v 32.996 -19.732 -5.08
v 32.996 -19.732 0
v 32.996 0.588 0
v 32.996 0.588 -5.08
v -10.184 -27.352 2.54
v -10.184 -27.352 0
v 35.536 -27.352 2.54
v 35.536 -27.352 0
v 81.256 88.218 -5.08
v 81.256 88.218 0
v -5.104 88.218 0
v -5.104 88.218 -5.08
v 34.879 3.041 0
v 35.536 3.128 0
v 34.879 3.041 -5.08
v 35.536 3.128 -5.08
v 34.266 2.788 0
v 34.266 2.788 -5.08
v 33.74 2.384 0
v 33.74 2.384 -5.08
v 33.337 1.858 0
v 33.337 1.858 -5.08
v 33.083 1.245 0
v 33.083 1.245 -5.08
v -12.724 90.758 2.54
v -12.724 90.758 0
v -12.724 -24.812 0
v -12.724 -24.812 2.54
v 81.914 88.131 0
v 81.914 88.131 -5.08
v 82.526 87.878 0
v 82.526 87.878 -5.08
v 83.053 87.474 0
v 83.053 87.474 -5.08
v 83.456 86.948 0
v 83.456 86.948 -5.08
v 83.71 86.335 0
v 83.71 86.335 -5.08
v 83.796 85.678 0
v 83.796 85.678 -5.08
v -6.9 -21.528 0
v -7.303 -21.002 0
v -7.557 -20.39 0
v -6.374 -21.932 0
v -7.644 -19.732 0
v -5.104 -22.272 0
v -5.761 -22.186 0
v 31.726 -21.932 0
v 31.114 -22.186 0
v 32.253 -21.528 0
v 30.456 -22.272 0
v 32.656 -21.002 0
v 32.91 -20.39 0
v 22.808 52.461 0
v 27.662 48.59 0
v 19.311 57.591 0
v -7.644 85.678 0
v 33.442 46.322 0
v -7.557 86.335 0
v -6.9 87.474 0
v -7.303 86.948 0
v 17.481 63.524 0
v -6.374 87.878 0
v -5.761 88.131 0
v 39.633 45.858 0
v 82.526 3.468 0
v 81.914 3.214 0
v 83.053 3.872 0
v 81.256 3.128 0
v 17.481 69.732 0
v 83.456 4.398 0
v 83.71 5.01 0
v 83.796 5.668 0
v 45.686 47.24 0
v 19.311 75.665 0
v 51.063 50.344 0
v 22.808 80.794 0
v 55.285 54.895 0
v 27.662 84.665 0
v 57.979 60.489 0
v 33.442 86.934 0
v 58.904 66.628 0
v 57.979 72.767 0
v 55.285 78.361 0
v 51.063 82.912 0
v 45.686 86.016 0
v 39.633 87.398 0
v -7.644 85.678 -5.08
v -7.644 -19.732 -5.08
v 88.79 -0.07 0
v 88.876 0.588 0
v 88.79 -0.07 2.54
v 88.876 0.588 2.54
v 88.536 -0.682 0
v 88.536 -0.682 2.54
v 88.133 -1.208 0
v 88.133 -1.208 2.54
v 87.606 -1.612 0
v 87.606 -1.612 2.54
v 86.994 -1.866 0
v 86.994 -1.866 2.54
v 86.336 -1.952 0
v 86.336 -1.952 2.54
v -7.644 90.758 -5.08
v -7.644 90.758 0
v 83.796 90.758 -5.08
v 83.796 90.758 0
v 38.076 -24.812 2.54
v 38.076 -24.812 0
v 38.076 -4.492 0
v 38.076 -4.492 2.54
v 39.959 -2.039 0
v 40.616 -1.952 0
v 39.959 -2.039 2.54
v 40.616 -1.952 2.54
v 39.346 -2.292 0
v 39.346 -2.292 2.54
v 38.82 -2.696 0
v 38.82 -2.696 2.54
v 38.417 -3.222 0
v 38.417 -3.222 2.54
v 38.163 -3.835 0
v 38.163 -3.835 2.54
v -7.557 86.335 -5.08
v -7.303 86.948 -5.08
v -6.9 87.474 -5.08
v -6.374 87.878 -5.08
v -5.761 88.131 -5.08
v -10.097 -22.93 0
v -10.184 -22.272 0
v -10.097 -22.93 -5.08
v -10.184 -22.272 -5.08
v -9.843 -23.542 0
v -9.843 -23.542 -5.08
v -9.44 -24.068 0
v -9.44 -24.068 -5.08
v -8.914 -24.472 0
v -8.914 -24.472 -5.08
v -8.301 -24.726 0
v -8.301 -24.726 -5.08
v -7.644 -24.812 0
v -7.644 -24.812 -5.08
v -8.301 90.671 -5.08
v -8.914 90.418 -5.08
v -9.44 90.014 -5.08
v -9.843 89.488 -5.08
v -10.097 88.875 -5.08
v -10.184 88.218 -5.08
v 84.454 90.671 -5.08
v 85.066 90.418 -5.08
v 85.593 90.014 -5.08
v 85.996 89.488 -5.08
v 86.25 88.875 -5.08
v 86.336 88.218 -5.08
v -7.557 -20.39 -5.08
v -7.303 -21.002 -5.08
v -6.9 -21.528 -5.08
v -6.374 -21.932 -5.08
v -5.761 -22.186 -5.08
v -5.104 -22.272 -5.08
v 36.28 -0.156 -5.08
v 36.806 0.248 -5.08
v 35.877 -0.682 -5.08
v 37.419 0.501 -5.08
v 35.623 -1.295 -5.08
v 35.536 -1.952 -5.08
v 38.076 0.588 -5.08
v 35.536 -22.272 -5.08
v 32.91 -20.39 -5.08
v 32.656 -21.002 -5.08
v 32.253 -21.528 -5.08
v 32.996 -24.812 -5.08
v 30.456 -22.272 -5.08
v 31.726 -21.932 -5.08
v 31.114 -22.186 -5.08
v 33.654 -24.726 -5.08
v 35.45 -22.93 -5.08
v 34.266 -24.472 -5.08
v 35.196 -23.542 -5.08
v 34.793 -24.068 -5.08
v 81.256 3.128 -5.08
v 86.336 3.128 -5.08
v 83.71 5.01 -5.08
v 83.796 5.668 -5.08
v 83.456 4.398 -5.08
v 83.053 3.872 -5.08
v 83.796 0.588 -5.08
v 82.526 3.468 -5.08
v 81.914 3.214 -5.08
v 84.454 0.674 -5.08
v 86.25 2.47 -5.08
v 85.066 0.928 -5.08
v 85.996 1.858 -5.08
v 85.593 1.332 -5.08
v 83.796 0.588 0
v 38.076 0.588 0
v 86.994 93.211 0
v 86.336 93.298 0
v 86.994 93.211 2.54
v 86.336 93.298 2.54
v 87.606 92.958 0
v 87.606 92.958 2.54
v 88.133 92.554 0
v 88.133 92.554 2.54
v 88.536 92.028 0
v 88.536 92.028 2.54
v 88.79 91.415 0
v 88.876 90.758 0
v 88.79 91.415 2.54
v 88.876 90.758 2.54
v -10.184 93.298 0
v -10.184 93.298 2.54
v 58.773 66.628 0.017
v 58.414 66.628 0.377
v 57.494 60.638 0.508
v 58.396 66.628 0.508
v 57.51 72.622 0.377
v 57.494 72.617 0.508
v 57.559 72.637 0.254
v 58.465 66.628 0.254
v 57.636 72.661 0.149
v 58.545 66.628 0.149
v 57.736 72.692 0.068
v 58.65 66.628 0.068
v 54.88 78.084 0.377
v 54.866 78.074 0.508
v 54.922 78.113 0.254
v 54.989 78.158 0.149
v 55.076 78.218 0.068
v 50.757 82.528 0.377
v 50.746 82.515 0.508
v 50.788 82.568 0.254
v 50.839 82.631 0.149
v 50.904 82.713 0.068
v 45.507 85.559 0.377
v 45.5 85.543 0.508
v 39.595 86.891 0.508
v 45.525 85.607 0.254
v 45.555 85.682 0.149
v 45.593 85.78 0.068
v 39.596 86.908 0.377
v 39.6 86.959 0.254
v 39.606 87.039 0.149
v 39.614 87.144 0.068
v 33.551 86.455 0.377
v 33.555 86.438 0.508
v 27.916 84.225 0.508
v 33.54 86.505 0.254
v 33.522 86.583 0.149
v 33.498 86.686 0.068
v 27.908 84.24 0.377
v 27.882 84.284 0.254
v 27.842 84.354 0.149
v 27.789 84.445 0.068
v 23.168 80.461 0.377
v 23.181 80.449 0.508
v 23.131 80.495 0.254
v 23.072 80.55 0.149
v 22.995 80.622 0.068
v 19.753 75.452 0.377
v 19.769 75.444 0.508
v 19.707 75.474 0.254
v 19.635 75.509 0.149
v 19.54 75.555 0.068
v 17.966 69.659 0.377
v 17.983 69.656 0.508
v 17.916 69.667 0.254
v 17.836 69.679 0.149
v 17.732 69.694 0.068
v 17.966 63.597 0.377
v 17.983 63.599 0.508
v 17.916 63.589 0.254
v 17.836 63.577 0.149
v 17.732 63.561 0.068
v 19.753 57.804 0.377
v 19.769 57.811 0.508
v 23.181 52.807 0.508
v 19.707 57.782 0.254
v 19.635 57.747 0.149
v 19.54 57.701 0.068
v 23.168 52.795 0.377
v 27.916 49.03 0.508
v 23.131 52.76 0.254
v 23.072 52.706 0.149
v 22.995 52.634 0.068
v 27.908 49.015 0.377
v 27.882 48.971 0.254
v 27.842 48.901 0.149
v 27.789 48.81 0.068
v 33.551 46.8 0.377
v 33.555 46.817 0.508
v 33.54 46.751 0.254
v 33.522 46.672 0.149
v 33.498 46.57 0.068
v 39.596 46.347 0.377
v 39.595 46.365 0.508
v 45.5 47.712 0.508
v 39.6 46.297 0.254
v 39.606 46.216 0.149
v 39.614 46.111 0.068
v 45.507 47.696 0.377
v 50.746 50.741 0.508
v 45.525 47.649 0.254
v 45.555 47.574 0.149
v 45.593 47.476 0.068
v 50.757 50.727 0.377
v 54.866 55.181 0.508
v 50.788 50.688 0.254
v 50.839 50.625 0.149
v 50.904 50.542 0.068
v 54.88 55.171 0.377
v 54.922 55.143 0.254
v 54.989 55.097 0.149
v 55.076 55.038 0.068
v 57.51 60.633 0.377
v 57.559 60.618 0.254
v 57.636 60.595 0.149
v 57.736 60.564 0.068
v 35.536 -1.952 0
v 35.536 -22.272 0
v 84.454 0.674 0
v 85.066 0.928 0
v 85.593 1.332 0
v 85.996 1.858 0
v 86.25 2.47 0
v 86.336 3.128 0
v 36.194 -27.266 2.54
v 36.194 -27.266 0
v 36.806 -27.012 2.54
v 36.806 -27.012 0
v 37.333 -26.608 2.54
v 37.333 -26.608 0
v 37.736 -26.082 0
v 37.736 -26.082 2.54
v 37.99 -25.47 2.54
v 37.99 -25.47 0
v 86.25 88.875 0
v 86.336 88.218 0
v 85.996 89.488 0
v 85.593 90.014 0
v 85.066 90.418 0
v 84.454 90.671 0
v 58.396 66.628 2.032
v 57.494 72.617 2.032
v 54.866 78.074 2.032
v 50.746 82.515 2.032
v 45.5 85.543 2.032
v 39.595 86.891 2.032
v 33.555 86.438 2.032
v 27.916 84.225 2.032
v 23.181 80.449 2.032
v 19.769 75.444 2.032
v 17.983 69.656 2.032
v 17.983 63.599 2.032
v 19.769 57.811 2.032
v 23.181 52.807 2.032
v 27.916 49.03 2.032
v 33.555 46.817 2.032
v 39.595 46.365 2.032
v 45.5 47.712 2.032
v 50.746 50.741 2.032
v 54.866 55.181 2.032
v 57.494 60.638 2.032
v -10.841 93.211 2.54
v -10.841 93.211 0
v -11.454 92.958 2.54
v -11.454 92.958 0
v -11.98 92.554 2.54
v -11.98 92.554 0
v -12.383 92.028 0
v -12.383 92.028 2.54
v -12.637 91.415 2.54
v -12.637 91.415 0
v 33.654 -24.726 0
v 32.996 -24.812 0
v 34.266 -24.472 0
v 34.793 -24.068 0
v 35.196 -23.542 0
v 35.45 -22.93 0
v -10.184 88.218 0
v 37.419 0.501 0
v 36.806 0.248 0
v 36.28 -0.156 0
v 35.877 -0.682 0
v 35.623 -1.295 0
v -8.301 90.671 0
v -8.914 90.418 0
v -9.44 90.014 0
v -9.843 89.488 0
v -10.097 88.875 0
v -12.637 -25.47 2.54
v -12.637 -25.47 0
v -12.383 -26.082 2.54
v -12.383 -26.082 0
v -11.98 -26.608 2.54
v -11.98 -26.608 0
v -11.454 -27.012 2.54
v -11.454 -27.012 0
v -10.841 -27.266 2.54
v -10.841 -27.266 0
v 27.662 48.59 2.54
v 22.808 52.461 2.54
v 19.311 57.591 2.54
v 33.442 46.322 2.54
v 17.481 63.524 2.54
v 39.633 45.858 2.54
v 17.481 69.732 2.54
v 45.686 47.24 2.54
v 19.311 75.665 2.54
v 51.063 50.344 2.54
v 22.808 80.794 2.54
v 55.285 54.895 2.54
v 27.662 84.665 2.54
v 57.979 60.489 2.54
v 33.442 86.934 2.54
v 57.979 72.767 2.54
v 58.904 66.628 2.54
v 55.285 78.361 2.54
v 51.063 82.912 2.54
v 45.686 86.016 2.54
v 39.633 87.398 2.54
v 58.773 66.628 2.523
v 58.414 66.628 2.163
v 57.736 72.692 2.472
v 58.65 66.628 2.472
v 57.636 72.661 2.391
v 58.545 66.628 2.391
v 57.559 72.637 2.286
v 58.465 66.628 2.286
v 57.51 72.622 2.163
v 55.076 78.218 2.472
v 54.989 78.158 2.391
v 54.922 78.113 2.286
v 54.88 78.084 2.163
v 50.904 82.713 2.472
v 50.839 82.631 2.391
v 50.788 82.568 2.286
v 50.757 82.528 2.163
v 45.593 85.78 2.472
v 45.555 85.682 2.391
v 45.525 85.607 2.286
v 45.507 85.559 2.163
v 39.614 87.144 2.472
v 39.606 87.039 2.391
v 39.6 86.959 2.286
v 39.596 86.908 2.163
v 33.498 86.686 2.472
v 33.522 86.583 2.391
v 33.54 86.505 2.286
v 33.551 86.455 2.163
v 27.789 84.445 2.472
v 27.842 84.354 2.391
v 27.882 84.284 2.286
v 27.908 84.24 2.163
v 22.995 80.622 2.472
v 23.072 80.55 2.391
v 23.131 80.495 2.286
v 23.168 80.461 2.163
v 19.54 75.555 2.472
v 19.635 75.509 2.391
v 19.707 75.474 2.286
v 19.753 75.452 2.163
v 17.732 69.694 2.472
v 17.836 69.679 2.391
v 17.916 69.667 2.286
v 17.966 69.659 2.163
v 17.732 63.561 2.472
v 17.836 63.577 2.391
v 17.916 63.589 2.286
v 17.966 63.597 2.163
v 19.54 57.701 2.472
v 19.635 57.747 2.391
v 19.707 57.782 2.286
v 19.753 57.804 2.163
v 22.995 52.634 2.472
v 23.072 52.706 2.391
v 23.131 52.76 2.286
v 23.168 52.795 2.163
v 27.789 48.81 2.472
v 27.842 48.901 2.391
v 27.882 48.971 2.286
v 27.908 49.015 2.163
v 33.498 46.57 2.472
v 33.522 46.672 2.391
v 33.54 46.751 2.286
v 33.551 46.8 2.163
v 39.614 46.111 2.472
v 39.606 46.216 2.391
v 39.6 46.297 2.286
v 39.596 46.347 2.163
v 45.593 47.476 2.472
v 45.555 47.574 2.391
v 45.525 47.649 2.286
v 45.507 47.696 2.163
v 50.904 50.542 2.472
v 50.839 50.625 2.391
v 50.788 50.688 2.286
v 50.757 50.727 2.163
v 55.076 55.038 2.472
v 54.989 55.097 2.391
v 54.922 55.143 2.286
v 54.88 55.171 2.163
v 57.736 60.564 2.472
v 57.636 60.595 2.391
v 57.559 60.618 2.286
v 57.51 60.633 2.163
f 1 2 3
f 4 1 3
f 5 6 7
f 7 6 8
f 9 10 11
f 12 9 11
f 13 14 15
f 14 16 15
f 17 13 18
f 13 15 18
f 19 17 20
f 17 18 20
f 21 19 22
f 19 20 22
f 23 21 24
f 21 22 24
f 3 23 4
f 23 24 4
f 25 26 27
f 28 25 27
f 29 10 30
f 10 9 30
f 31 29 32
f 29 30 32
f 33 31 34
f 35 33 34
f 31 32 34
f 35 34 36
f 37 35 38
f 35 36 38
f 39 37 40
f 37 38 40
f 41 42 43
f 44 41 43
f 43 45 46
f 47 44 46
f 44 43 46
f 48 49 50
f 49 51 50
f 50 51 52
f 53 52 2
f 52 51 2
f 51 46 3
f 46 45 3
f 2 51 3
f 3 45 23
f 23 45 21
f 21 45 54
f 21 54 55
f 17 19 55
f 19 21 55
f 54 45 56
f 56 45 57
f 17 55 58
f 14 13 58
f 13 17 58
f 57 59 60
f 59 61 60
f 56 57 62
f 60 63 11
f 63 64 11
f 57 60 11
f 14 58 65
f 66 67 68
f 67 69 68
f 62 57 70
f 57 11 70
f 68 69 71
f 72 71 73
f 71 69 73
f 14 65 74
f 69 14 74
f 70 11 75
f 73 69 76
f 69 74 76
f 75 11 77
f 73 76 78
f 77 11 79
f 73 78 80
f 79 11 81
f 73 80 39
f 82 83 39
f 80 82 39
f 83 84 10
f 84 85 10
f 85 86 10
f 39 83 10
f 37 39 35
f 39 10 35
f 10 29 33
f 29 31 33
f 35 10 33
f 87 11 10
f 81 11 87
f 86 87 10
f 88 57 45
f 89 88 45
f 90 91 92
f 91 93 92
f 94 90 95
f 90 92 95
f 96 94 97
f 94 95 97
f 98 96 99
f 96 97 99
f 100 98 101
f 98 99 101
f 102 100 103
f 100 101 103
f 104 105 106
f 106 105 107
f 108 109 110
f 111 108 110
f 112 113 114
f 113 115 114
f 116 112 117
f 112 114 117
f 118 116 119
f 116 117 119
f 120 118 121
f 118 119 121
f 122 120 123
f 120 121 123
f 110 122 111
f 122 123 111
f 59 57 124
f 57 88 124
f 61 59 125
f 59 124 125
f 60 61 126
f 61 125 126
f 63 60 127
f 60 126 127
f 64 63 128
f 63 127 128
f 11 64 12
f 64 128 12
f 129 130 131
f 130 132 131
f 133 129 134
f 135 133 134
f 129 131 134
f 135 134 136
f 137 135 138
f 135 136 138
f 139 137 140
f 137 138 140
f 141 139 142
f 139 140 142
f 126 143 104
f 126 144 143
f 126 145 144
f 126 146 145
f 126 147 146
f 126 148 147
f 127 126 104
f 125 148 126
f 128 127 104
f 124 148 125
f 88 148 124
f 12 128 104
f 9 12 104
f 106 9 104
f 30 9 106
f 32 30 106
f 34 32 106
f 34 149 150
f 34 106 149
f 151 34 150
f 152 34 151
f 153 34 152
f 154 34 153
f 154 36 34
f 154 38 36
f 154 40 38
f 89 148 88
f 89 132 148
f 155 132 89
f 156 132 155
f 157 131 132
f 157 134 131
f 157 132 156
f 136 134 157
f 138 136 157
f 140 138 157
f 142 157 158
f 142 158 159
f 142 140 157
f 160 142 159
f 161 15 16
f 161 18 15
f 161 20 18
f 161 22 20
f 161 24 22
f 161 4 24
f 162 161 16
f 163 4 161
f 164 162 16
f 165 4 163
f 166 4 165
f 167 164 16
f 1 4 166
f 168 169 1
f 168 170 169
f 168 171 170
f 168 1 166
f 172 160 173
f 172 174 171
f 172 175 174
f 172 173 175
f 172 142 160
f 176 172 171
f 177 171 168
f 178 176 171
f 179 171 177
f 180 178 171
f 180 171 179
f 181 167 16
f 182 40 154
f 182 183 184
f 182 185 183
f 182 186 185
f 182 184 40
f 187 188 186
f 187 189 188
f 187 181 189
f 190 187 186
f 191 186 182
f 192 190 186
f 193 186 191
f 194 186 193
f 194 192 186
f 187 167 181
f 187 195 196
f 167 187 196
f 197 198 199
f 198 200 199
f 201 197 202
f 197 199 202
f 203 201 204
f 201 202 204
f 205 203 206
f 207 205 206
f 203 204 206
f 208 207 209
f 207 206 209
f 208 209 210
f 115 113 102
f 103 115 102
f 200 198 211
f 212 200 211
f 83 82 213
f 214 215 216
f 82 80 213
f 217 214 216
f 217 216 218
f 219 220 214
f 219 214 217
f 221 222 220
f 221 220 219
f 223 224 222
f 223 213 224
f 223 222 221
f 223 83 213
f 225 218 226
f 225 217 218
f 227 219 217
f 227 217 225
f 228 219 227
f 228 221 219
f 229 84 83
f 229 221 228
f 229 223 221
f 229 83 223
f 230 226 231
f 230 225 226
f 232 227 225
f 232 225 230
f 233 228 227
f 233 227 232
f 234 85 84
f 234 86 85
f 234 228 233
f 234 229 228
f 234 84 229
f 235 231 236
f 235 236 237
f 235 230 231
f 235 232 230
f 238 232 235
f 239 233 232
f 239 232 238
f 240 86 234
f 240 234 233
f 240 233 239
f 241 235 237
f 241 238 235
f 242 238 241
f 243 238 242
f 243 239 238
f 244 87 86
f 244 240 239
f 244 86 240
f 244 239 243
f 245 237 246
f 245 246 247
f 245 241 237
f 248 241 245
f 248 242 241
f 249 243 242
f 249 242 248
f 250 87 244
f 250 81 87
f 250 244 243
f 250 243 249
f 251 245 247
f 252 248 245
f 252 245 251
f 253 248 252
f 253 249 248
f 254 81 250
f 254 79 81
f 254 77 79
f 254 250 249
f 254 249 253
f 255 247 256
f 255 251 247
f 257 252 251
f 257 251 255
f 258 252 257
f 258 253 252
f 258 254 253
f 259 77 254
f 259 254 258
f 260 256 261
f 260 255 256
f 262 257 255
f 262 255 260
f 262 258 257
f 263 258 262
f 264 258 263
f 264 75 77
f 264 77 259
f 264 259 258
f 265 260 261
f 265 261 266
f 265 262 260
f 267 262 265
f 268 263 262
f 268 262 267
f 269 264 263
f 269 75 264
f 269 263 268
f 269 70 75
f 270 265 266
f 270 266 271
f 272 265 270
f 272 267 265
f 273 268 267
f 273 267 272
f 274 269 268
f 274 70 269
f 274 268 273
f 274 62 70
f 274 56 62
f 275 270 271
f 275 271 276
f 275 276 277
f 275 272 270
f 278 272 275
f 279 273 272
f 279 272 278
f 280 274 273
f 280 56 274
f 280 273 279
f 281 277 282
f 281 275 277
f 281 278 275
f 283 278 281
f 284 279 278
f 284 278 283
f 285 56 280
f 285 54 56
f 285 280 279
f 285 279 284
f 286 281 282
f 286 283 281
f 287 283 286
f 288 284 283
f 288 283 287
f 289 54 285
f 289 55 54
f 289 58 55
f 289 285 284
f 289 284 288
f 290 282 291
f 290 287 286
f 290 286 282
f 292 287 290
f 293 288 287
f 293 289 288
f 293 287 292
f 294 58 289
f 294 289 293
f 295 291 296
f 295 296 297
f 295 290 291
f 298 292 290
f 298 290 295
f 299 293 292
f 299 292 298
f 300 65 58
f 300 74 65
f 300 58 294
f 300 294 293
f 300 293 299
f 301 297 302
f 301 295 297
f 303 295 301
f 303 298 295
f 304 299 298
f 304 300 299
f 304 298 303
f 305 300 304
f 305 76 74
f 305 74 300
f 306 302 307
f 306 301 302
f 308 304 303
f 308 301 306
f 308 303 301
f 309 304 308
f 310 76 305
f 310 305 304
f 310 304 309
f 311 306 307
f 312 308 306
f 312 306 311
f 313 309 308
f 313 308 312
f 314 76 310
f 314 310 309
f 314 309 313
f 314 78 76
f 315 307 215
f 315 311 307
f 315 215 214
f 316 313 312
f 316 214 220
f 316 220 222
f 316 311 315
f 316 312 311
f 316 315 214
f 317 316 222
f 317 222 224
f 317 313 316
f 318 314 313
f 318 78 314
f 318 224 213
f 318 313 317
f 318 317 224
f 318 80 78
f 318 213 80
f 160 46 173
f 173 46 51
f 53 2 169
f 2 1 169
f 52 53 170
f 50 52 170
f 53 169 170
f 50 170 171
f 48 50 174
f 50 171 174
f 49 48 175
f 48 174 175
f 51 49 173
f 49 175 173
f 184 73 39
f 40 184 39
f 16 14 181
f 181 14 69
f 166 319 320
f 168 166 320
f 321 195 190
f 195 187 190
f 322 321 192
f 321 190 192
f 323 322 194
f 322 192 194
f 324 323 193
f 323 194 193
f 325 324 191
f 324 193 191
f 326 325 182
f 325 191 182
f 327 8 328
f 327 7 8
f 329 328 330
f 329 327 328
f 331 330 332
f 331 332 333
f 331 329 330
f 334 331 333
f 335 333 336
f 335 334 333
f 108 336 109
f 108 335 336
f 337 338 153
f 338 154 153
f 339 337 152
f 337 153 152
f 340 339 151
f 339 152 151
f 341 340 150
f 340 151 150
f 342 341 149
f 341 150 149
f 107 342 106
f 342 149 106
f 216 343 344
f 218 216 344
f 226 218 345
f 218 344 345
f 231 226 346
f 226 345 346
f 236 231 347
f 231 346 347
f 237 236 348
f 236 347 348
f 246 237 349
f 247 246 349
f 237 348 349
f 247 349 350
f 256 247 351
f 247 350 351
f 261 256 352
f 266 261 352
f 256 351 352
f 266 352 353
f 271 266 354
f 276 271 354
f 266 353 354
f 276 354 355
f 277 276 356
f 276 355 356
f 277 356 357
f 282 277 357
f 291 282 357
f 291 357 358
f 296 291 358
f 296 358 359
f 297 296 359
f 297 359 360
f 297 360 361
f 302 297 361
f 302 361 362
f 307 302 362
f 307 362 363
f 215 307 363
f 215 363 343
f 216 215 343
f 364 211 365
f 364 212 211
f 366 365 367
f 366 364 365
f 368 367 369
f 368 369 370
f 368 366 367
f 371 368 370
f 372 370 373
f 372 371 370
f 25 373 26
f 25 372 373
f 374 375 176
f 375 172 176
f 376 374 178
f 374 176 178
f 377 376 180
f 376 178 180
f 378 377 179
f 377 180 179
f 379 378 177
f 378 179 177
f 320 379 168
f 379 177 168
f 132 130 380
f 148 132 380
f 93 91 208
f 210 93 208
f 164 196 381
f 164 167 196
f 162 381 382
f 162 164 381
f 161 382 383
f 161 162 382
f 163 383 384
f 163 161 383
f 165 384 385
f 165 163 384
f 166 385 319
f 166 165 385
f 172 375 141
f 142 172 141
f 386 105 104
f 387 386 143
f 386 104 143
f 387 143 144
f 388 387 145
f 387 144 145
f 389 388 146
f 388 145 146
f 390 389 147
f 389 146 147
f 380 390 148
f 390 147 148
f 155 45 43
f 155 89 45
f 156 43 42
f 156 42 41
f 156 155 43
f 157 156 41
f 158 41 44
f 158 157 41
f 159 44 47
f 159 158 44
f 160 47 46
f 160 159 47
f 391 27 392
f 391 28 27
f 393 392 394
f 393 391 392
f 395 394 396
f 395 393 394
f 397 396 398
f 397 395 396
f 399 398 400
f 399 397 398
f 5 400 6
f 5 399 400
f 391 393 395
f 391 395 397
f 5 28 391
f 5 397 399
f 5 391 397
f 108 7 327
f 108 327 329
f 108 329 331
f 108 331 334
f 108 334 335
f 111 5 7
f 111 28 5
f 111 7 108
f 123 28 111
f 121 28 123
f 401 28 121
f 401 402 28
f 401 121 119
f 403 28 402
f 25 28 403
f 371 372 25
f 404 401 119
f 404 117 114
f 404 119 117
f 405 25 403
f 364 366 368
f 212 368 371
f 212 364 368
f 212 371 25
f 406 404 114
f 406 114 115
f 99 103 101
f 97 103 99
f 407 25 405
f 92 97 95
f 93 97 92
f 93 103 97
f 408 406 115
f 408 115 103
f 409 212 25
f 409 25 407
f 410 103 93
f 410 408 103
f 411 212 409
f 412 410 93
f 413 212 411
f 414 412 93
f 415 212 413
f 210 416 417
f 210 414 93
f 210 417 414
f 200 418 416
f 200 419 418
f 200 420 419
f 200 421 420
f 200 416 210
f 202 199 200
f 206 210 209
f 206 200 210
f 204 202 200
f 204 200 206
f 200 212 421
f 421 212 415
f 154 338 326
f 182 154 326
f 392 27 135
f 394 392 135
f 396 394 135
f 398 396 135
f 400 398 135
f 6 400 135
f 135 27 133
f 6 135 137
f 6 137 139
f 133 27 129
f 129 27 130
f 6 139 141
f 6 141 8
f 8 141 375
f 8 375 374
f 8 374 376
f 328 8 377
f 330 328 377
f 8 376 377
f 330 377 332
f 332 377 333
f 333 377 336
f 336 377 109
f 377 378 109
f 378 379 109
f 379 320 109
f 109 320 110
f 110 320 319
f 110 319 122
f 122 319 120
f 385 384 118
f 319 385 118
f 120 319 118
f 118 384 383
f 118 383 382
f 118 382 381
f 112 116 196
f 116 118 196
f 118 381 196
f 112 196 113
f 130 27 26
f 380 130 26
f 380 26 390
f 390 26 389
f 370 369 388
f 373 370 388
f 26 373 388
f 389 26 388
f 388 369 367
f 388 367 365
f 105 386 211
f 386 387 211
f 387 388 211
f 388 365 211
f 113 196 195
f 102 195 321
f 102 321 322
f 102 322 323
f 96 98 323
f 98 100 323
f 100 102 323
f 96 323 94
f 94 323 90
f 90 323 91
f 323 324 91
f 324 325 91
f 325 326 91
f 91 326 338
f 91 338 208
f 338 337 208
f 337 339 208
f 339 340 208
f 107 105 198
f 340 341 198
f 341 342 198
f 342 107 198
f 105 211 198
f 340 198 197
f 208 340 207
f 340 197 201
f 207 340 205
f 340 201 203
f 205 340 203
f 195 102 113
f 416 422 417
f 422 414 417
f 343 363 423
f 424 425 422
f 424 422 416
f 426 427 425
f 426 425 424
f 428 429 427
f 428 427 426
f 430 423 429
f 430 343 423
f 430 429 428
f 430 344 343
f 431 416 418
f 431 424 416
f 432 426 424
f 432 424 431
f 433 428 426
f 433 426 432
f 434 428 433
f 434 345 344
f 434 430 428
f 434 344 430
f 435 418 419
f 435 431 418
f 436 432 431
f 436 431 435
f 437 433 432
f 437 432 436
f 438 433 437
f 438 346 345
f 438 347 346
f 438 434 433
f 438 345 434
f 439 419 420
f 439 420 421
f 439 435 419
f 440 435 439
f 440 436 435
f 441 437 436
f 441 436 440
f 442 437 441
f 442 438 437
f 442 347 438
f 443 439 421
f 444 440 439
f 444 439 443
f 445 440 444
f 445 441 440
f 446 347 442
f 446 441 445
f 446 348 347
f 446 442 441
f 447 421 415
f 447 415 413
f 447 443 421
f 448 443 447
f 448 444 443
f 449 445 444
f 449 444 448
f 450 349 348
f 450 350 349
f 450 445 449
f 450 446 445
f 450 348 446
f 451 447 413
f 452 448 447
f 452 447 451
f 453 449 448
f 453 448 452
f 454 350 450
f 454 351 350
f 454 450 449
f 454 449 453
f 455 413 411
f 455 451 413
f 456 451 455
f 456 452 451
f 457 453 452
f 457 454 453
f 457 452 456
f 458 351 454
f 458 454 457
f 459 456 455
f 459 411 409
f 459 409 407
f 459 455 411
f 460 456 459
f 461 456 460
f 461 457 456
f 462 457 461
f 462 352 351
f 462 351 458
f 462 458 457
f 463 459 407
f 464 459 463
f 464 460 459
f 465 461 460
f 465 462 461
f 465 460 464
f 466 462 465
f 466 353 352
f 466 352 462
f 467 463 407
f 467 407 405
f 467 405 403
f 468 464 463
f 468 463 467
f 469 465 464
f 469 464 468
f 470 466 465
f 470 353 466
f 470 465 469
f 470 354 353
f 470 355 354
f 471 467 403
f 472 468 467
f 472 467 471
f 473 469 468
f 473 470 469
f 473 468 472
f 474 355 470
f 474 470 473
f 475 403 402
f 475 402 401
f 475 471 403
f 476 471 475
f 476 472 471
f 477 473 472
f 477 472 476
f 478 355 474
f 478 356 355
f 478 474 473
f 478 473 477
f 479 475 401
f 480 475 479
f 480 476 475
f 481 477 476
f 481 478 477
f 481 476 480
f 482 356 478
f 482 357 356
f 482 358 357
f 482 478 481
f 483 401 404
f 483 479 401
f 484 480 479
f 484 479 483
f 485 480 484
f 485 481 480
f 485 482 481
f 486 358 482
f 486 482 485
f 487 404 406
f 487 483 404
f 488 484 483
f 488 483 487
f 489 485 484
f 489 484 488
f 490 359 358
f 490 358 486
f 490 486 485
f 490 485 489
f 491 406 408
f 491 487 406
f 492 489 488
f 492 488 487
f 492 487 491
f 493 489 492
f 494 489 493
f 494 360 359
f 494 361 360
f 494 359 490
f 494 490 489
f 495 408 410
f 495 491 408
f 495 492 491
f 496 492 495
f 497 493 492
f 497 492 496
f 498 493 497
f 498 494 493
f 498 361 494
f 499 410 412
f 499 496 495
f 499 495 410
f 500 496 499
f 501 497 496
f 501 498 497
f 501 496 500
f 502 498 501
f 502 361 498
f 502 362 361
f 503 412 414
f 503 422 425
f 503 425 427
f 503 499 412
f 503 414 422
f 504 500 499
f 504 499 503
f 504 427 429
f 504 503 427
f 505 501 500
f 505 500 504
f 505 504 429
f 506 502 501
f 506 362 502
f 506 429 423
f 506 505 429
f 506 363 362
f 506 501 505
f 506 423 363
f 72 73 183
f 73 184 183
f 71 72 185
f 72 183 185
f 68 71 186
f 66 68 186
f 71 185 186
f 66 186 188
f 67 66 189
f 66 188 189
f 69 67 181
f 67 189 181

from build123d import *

# Parameters (mm, degrees)
F1_DEPTH = 2.54
F3_DEPTH = 5.08
F4_R     = 20.32
F5_DEPTH = 7.621
F6_R     = 2.54
F7_R     = 0.508


with BuildPart() as f1:
    # F0 (on Top) → F1 (new body)
    with BuildSketch(Plane.XY):
        Polygon((88.876464, 93.29783), (-12.723536, 93.29783), (-12.723536, -27.35217), (38.076464, -27.35217), (38.076464, -1.95217), (88.876464, -1.95217), align=None)
    extrude(amount=F1_DEPTH)

    # F2 (on face) → F3 (join)
    with BuildSketch(Plane(origin=(0, 0, 0), x_dir=(1, 0, 0), z_dir=(0, 0, -1))):
        Polygon((35.536464, -0.58783), (35.536464, 24.81217), (-10.183536, 24.81217), (-10.183536, -90.75783), (86.336464, -90.75783), (86.336464, -0.58783), align=None)
        Polygon((-7.643536, 22.27217), (32.996464, 22.27217), (32.996464, -3.12783), (83.796464, -3.12783), (83.796464, -88.21783), (-7.643536, -88.21783), align=None, mode=Mode.SUBTRACT)
    extrude(amount=F3_DEPTH)

    # F4 (on face) → F5 (cut, through all)
    with BuildSketch(Plane.XY.offset(2.54)):
        with Locations((38.076464, 66.62783)):
            Circle(F4_R)
    extrude(amount=-F5_DEPTH, mode=Mode.SUBTRACT)

    # F6
    f6_edges = [f1.edges().sort_by_distance(p)[0] for p in [
        (38.076464, -27.35217, 1.27),
        (35.536464, -24.81217, -2.54),
        (35.536464, 0.58783, -2.54),
        (38.076464, -1.95217, 1.27),
        (86.336464, 0.58783, -2.54),
        (88.876464, -1.95217, 1.27),
        (-12.723536, -27.35217, 1.27),
        (-10.183536, -24.81217, -2.54),
        (88.876464, 93.29783, 1.27),
        (86.336464, 90.75783, -2.54),
        (-12.723536, 93.29783, 1.27),
        (-10.183536, 90.75783, -2.54),
        (32.996464, 3.12783, -2.54),
        (32.996464, -22.27217, -2.54),
        (-7.643536, -22.27217, -2.54),
        (-7.643536, 88.21783, -2.54),
        (83.796464, 88.21783, -2.54),
        (83.796464, 3.12783, -2.54),
    ]]
    fillet(f6_edges, radius=F6_R)

    # F7
    f7_edges = [f1.edges().sort_by_distance(p)[0] for p in [
        (17.756464, 66.62783, 0),
        (17.756464, 66.62783, 2.54),
    ]]
    fillet(f7_edges, radius=F7_R)


solid = f1.part
